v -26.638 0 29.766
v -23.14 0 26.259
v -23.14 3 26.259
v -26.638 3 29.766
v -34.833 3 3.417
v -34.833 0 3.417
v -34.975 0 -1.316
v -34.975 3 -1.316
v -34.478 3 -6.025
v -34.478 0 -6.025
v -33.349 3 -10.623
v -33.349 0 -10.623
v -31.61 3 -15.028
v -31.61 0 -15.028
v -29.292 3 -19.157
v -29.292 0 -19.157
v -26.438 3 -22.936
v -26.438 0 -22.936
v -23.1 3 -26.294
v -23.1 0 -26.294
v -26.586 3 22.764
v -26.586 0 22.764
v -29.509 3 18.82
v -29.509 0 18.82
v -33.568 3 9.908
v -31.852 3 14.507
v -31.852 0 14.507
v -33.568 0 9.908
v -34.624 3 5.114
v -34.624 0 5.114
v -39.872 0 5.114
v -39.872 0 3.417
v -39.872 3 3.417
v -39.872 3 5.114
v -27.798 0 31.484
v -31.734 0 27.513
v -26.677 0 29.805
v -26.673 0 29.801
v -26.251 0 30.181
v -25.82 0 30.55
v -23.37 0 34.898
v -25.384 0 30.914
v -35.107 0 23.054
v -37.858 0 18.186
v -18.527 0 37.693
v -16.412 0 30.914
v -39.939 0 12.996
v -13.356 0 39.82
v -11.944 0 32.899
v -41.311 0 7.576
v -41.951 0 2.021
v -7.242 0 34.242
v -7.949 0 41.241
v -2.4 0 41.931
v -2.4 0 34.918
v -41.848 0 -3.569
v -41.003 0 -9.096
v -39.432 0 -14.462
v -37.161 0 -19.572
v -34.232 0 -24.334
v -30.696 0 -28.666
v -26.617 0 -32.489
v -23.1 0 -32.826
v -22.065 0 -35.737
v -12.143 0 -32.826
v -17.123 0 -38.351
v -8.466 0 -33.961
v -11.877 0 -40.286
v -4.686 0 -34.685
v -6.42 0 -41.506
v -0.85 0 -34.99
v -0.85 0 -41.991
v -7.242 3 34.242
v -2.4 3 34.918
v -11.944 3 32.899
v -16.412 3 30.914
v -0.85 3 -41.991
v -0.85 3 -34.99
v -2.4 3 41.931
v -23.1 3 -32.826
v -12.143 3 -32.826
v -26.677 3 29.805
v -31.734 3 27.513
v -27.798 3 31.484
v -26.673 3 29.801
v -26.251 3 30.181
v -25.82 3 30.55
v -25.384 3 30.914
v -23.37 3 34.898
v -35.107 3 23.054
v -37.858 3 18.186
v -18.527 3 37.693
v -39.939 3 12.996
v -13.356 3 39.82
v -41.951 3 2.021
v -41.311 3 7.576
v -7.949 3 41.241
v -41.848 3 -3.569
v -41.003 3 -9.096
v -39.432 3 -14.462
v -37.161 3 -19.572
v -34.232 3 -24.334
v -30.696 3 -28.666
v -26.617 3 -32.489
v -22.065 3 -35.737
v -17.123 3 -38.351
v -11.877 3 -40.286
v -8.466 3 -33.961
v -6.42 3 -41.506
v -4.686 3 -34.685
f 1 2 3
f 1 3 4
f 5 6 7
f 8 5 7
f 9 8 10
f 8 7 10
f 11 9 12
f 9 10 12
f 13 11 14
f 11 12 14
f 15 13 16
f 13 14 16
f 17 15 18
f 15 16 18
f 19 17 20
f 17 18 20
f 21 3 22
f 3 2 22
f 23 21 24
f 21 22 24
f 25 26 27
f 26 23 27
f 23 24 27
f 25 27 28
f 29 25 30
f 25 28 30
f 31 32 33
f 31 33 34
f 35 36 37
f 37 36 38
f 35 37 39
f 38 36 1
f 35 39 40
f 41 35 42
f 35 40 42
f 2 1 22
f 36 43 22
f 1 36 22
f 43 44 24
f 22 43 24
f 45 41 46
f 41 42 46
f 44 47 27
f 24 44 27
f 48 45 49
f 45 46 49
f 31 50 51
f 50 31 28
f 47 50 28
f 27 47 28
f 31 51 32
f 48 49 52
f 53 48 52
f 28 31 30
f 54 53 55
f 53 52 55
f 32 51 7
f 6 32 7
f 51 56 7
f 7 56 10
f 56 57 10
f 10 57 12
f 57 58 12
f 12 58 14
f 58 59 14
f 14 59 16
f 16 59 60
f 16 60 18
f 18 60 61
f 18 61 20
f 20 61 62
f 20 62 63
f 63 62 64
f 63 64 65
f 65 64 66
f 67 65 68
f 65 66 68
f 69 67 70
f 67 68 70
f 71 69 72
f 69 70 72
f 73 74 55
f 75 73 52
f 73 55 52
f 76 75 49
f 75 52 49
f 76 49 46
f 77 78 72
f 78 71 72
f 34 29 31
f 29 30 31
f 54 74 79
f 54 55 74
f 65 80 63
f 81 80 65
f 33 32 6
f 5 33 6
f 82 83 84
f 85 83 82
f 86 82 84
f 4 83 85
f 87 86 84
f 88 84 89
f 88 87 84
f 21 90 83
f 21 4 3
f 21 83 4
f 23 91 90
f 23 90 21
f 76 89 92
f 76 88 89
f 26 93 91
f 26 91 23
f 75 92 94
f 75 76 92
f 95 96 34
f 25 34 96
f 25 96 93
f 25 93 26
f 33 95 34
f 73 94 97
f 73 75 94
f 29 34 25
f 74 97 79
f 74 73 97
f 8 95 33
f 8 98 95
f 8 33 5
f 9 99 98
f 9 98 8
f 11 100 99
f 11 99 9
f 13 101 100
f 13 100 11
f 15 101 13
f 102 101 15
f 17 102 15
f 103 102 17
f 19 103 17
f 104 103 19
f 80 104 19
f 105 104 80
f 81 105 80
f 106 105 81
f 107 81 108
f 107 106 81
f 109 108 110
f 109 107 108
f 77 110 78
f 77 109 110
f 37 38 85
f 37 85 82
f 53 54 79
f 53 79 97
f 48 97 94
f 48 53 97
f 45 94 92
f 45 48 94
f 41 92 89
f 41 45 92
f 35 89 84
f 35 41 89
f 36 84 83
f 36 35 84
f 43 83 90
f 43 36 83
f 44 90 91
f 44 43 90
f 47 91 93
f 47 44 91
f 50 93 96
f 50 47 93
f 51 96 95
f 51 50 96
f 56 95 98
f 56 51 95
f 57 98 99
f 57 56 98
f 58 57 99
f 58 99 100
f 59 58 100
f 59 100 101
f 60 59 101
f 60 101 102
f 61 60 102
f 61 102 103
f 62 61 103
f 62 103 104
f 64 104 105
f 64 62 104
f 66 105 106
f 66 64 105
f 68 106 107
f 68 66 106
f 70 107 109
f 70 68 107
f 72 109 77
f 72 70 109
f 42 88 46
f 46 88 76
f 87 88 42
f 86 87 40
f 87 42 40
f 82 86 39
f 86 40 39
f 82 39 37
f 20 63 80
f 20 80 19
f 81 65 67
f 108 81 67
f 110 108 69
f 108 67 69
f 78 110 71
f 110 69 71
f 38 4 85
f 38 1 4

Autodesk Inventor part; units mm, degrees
ref_plane "YZ Plane" through (0, 0, 0) normal (1, 0, 0) x (0, 1, 0)
ref_plane "XZ Plane" through (0, 0, 0) normal (0, 1, 0) x (-1, 0, 0)
ref_plane "XY Plane" through (0, 0, 0) normal (0, 0, 1) x (1, 0, 0)
sketch "Sketch1" plane through (0, 0, 0) normal (0, 1, 0) x (-1, 0, 0)
  circle A0 centre (0, 0) radius 40 projected
  circle A1 centre (0, 0) radius 35 projected
  line L0 (2.3, 32.9859) -> (2.3, 40) projected
  line L1 (21.9637, 27.3435) -> (25.5064, 30.8949) projected
  line L2 (21.9637, 27.3435) -> (21.9123, 27.292)
  line L3 (26.5671, 29.8368) -> (23.0244, 26.2855) projected
  line L4 (26.5671, 29.8368) -> (26.6021, 29.8719)
  line L5 (25.4356, 30.9655) -> (21.8929, 27.4142)
  line L6 (21.8929, 27.4142) -> (21.8415, 27.3626)
  line L7 (21.8415, 27.3626) -> (21.8337, 27.3548)
  line L8 (23.0952, 26.2148) -> (26.6379, 29.7662)
  line L9 (26.6379, 29.7662) -> (26.6729, 29.8013)
  line L10 (26.6729, 29.8013) -> (26.6768, 29.8052)
  circle A2 centre (0, 0) radius 42
  line L11 (2.4, 32.9859) -> (2.4, 39.9955)
  line L12 (34.7391, 5.0137) -> (39.7719, 5.0137) projected
  line L13 (39.7719, 3.5174) -> (34.7391, 3.5174) projected
  line L14 (34.7391, 5.1137) -> (39.7645, 5.1137)
  line L15 (39.7719, 3.4174) -> (34.7391, 3.4174)
  line L16 (34.7391, 5.1137) -> (34.6244, 5.1137)
  line L17 (39.7719, 3.4174) -> (39.8538, 3.4174)
  line L18 (23, -32.7261) -> (23, -26.3818) projected
  line L19 (23.1, -32.7236) -> (23.1, -26.3856)
  line L20 (23.1, -26.3856) -> (23.1, -26.2943)
  line L21 (21.5, -32.7261) -> (21.5, -26.3818) projected
  line L22 (21.4, -32.723) -> (21.4, -26.3818)
  line L23 (21.4, -32.723) -> (21.4, -33.7941)
  line L24 (0.75, -35) -> (0.75, -40) projected
  line L25 (0.85, -35.0011) -> (0.85, -39.8733)
  line L26 (0.85, -35.0011) -> (0.85, -34.9897)
  line L27 (0.85, -39.8733) -> (0.85, -41.9914)
  line L28 (2.4, 39.9955) -> (2.4, 41.9314)
  line L29 (23, -32.7261) -> (21.5, -32.7261) projected
  line L30 (22.8571, -32.8261) -> (21.4, -32.8261)
  line L31 (23.1, -32.7236) -> (23.1, -32.8261)
  line L32 (22.8571, -32.8261) -> (23.1, -32.8261)
  line L33 (39.7719, 5.0137) -> (39.7719, 3.5174) projected
  line L34 (39.8719, 3.4174) -> (39.8719, 5.1137)
  line L35 (39.7645, 5.1137) -> (39.8719, 5.1137)
  line L36 (39.8719, 3.4174) -> (39.8538, 3.4174)
  point P0 (2.4, 34.9176)
  point P1 (25.3839, 30.9137)
  point P2 (23.1396, 26.2594)
  point P3 (39.6718, 5.1137)
  point P4 (34.8328, 3.4174)
  point P5 (23.1, -32.6556)
  point P6 (21.4, -27.6955)
  dimension "d0" = 0.1
  dimension "d1" = 0.1
  dimension "d2" = 2
  dimension "d3" = 0.1
  dimension "d4" = 0.1
  dimension "d5" = 0.1
  dimension "d6" = 0.1
  dimension "d7" = 0.1
  dimension "d8" = 0.1
  dimension "d13" = 0.1
  dimension "d16" = 0.1
extrude "Extrusion1" add sketch "Sketch1" along normal blind 3 contours A0 L19 L20 A1 L15 L17 | A0 L36 L34 L35 L14 L11 L28 A2 L27 L32 L31 L19 | L14 L16 A1 L8 L9 L10 A0 | A0 L27 L25 L26 A1 L22 L23 | L5 L6 L7 A1 L11 A0
sketch "Sketch2" plane through (0, 3, 0) normal (0, 1, 0) x (1, 0, 0)
  line L0 (-21.4, 33.7941) -> (-21.4, 27.6955) projected
  arc A0 (-0.85, 34.9897) -> (-21.4, 27.6955) centre (0, 0) ccw projected
  line L1 (-25.3839, -30.9137) -> (-16.4117, -30.9137)
  arc A1 (-21.8337, -27.3548) -> (-2.4, -34.9176) centre (0, 0) ccw projected
  line L2 (-21.8337, -27.3548) -> (-25.3839, -30.9137) projected
  line L3 (-23.1, 32.8261) -> (-12.1427, 32.8261)
  point P0 (-9.1082, 33.7941)
  point P1 (-21.4, 32.8261)
extrude "Extrusion2" cut sketch "Sketch2" against normal through all
sketch "Sketch3" plane through (0, 3, 0) normal (0, 1, 0) x (1, 0, 0)
  line L0 (-21.4, 33.7941) -> (-21.4, 32.8261) projected
  line L1 (-22.8571, 32.8261) -> (-21.4, 32.8261)
  arc A0 (-21.4, 33.7941) -> (-22.8571, 32.8261) centre (0, 0) ccw projected
extrude "Extrusion3" add sketch "Sketch3" against normal blind 3
equation "\"d0\" = slack"
equation "\"d1\" = slack"
equation "\"d3\" = slack"
equation "\"d4\" = slack"
equation "\"d5\" = slack"
equation "\"d6\" = slack"
equation "\"d7\" = slack"
equation "\"d8\" = slack"
equation "\"d13\" = slack"
equation "\"d16\" = slack"
equation "\"d9\" = thicc"
equation "\"d14\" = thicc"
equation "\"slack\" = 0.1"
equation "\"thicc\" = 3"
properties part number "Front_aligner"
